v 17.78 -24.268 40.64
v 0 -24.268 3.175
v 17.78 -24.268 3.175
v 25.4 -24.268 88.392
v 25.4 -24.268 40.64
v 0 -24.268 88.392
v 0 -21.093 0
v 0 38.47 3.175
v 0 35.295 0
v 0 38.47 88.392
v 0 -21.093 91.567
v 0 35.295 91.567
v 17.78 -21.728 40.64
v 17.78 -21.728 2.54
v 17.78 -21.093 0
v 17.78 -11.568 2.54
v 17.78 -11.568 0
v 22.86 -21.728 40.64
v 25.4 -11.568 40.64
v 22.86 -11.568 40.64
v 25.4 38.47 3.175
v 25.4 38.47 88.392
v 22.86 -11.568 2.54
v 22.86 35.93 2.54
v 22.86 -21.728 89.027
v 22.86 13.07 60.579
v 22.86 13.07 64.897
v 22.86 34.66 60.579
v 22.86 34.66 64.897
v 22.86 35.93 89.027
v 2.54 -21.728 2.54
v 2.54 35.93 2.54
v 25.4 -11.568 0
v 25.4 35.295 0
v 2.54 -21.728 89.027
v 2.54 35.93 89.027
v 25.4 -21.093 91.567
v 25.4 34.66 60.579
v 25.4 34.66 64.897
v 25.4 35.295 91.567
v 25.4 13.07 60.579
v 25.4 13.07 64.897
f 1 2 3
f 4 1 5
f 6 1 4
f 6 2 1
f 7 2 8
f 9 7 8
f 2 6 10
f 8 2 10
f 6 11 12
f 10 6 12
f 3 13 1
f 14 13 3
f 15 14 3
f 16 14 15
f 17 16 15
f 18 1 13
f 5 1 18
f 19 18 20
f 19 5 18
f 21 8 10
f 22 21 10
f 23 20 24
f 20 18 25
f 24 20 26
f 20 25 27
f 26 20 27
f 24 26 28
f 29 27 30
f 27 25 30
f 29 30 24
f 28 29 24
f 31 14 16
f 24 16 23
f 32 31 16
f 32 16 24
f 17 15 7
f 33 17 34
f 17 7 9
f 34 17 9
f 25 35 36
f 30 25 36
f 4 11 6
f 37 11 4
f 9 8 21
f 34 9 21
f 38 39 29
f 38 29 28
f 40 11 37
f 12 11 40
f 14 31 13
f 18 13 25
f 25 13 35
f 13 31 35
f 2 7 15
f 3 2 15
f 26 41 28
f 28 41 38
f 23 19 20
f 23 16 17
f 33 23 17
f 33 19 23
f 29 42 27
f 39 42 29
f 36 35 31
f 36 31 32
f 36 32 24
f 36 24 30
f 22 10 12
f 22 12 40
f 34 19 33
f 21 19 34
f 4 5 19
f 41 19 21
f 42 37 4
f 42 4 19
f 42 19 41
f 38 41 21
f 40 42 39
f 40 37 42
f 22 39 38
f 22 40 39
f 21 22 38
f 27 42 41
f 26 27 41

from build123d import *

# Parameters (mm, degrees)
THICKEN2_OUTLINE_W   = 62.738
THICKEN2_OUTLINE_H   = 91.567
THICKEN2_OUTLINE_W_2 = 57.658
THICKEN2_OUTLINE_H_2 = 86.487
THICKEN2_DEPTH       = 25.4
THICKEN2_2_OUTLINE_W = 57.658
THICKEN2_2_OUTLINE_H = 86.487
THICKEN2_2_DEPTH     = 2.54
THICKEN2_START       = 22.86
THICKEN2_3_OUTLINE_W = 57.658
THICKEN2_3_OUTLINE_H = 86.487
THICKEN2_3_DEPTH     = 2.54
CHAMFER2_SIZE        = 3.175
SKETCH10_W           = 56.529750703
SKETCH10_H           = 12.7
CUT_EXTRUDE2_DEPTH   = 7.62
CUT_EXTRUDE3_REACH   = 104.516
SKETCH11_W           = 4.318
SKETCH11_H           = 21.59


# Read off the part's stored shape, not the designer's step: Thicken2
with BuildPart() as part:
    # Thicken2 outline → Thicken2 (new body)
    with BuildSketch(Plane.YZ):
        with Locations((7.10118863, 45.7835)):
            Rectangle(THICKEN2_OUTLINE_W, THICKEN2_OUTLINE_H)
        with Locations((7.10118863, 45.7835)):
            Rectangle(THICKEN2_OUTLINE_W_2, THICKEN2_OUTLINE_H_2, mode=Mode.SUBTRACT)
    extrude(amount=THICKEN2_DEPTH)

    # Thicken2 2 outline → Thicken2 2 (add)
    with BuildSketch(Plane.YZ):
        with Locations((7.10118863, 45.7835)):
            Rectangle(THICKEN2_2_OUTLINE_W, THICKEN2_2_OUTLINE_H)
    extrude(amount=THICKEN2_2_DEPTH)

    # Thicken2 3 outline → Thicken2 3 (add)
    with BuildSketch(Plane.YZ.offset(THICKEN2_START)):
        with Locations((7.10118863, 45.7835)):
            Rectangle(THICKEN2_3_OUTLINE_W, THICKEN2_3_OUTLINE_H)
    extrude(amount=THICKEN2_3_DEPTH)

    # Chamfer2
    chamfer2_edges = [part.edges().sort_by_distance(p)[0] for p in [
        (12.7, 38.47018863, 0),
        (12.7, 38.47018863, 91.567),
        (12.7, -24.26781137, 0),
        (12.7, -24.26781137, 91.567),
    ]]
    chamfer(chamfer2_edges, length=CHAMFER2_SIZE)

    # Sketch10 → Cut-Extrude2 (cut)
    with BuildSketch(Plane(origin=(25.4, 0, 0), x_dir=(0, 0, -1), z_dir=(1, 0, 0))):
        with Locations((-12.375124648, -17.91781137)):
            Rectangle(SKETCH10_W, SKETCH10_H)
    extrude(amount=-CUT_EXTRUDE2_DEPTH, mode=Mode.SUBTRACT)

    # Sketch11 → Cut-Extrude3 (cut, up to next)
    with BuildSketch(Plane(origin=(25.4, 0, 0), x_dir=(0, 0, -1), z_dir=(1, 0, 0)), mode=Mode.PRIVATE) as cut_extrude3_sk1:
        with Locations((-62.738, 23.86518863)):
            Rectangle(SKETCH11_W, SKETCH11_H)
    cut_extrude3_tool1 = extrude(cut_extrude3_sk1.sketch, amount=-CUT_EXTRUDE3_REACH, mode=Mode.PRIVATE) & part.part
    add(cut_extrude3_tool1.solids().sort_by_distance((25.4, 23.865189, 62.738))[0], mode=Mode.SUBTRACT)


solid = part.part
